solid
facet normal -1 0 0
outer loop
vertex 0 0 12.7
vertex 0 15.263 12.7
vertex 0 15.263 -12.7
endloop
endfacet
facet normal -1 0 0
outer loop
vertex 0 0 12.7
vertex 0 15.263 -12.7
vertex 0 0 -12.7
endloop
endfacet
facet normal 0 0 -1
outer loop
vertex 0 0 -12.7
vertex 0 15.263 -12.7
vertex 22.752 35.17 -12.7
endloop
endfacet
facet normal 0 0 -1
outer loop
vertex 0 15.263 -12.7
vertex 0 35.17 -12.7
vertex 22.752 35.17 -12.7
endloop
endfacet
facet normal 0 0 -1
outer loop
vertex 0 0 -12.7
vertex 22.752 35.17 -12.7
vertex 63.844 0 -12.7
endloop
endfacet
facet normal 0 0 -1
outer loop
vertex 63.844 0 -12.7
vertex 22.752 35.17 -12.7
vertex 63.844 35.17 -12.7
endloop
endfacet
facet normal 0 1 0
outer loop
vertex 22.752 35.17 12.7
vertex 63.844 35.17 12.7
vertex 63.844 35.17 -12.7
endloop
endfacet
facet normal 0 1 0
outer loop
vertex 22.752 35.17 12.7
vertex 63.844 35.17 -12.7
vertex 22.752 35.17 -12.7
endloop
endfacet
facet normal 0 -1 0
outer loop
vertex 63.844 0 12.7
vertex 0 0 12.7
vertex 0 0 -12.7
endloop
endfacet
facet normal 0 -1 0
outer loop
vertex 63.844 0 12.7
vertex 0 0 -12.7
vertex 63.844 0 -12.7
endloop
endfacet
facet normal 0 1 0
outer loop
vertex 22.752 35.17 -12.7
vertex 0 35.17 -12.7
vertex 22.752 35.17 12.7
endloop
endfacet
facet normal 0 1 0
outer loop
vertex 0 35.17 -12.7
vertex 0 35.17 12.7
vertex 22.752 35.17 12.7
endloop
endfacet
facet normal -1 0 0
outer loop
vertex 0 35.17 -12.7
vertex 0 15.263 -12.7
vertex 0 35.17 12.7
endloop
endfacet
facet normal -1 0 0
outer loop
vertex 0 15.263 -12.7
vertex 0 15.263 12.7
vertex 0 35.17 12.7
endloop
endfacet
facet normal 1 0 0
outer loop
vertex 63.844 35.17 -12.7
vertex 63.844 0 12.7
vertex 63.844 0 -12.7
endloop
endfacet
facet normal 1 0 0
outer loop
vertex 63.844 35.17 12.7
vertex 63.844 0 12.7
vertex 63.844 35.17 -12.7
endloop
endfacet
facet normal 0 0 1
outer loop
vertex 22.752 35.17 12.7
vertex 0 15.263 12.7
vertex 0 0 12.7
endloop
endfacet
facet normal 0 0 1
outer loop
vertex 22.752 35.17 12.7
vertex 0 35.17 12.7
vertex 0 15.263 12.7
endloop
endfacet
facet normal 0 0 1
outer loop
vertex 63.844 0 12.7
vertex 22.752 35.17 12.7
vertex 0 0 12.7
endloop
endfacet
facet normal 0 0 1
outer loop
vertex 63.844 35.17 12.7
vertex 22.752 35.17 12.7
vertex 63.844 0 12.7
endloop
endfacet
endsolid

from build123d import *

# Parameters (mm, degrees)
F0_W     = 22.751659
F0_H     = 19.907701
F1_DEPTH = 12.7


with BuildPart() as f1:
    # F0 (on Top) → F1 (new body, symmetric)
    with BuildSketch(Plane.XY):
        Polygon((0, 15.262571), (0, 0), (63.8441, 0), (63.8441, 35.170272), (22.751659, 35.170272), (22.751659, 15.262571), align=None)
        with Locations((11.37583, 25.216421)):
            Rectangle(F0_W, F0_H)
    extrude(amount=F1_DEPTH, both=True)


solid = f1.part
